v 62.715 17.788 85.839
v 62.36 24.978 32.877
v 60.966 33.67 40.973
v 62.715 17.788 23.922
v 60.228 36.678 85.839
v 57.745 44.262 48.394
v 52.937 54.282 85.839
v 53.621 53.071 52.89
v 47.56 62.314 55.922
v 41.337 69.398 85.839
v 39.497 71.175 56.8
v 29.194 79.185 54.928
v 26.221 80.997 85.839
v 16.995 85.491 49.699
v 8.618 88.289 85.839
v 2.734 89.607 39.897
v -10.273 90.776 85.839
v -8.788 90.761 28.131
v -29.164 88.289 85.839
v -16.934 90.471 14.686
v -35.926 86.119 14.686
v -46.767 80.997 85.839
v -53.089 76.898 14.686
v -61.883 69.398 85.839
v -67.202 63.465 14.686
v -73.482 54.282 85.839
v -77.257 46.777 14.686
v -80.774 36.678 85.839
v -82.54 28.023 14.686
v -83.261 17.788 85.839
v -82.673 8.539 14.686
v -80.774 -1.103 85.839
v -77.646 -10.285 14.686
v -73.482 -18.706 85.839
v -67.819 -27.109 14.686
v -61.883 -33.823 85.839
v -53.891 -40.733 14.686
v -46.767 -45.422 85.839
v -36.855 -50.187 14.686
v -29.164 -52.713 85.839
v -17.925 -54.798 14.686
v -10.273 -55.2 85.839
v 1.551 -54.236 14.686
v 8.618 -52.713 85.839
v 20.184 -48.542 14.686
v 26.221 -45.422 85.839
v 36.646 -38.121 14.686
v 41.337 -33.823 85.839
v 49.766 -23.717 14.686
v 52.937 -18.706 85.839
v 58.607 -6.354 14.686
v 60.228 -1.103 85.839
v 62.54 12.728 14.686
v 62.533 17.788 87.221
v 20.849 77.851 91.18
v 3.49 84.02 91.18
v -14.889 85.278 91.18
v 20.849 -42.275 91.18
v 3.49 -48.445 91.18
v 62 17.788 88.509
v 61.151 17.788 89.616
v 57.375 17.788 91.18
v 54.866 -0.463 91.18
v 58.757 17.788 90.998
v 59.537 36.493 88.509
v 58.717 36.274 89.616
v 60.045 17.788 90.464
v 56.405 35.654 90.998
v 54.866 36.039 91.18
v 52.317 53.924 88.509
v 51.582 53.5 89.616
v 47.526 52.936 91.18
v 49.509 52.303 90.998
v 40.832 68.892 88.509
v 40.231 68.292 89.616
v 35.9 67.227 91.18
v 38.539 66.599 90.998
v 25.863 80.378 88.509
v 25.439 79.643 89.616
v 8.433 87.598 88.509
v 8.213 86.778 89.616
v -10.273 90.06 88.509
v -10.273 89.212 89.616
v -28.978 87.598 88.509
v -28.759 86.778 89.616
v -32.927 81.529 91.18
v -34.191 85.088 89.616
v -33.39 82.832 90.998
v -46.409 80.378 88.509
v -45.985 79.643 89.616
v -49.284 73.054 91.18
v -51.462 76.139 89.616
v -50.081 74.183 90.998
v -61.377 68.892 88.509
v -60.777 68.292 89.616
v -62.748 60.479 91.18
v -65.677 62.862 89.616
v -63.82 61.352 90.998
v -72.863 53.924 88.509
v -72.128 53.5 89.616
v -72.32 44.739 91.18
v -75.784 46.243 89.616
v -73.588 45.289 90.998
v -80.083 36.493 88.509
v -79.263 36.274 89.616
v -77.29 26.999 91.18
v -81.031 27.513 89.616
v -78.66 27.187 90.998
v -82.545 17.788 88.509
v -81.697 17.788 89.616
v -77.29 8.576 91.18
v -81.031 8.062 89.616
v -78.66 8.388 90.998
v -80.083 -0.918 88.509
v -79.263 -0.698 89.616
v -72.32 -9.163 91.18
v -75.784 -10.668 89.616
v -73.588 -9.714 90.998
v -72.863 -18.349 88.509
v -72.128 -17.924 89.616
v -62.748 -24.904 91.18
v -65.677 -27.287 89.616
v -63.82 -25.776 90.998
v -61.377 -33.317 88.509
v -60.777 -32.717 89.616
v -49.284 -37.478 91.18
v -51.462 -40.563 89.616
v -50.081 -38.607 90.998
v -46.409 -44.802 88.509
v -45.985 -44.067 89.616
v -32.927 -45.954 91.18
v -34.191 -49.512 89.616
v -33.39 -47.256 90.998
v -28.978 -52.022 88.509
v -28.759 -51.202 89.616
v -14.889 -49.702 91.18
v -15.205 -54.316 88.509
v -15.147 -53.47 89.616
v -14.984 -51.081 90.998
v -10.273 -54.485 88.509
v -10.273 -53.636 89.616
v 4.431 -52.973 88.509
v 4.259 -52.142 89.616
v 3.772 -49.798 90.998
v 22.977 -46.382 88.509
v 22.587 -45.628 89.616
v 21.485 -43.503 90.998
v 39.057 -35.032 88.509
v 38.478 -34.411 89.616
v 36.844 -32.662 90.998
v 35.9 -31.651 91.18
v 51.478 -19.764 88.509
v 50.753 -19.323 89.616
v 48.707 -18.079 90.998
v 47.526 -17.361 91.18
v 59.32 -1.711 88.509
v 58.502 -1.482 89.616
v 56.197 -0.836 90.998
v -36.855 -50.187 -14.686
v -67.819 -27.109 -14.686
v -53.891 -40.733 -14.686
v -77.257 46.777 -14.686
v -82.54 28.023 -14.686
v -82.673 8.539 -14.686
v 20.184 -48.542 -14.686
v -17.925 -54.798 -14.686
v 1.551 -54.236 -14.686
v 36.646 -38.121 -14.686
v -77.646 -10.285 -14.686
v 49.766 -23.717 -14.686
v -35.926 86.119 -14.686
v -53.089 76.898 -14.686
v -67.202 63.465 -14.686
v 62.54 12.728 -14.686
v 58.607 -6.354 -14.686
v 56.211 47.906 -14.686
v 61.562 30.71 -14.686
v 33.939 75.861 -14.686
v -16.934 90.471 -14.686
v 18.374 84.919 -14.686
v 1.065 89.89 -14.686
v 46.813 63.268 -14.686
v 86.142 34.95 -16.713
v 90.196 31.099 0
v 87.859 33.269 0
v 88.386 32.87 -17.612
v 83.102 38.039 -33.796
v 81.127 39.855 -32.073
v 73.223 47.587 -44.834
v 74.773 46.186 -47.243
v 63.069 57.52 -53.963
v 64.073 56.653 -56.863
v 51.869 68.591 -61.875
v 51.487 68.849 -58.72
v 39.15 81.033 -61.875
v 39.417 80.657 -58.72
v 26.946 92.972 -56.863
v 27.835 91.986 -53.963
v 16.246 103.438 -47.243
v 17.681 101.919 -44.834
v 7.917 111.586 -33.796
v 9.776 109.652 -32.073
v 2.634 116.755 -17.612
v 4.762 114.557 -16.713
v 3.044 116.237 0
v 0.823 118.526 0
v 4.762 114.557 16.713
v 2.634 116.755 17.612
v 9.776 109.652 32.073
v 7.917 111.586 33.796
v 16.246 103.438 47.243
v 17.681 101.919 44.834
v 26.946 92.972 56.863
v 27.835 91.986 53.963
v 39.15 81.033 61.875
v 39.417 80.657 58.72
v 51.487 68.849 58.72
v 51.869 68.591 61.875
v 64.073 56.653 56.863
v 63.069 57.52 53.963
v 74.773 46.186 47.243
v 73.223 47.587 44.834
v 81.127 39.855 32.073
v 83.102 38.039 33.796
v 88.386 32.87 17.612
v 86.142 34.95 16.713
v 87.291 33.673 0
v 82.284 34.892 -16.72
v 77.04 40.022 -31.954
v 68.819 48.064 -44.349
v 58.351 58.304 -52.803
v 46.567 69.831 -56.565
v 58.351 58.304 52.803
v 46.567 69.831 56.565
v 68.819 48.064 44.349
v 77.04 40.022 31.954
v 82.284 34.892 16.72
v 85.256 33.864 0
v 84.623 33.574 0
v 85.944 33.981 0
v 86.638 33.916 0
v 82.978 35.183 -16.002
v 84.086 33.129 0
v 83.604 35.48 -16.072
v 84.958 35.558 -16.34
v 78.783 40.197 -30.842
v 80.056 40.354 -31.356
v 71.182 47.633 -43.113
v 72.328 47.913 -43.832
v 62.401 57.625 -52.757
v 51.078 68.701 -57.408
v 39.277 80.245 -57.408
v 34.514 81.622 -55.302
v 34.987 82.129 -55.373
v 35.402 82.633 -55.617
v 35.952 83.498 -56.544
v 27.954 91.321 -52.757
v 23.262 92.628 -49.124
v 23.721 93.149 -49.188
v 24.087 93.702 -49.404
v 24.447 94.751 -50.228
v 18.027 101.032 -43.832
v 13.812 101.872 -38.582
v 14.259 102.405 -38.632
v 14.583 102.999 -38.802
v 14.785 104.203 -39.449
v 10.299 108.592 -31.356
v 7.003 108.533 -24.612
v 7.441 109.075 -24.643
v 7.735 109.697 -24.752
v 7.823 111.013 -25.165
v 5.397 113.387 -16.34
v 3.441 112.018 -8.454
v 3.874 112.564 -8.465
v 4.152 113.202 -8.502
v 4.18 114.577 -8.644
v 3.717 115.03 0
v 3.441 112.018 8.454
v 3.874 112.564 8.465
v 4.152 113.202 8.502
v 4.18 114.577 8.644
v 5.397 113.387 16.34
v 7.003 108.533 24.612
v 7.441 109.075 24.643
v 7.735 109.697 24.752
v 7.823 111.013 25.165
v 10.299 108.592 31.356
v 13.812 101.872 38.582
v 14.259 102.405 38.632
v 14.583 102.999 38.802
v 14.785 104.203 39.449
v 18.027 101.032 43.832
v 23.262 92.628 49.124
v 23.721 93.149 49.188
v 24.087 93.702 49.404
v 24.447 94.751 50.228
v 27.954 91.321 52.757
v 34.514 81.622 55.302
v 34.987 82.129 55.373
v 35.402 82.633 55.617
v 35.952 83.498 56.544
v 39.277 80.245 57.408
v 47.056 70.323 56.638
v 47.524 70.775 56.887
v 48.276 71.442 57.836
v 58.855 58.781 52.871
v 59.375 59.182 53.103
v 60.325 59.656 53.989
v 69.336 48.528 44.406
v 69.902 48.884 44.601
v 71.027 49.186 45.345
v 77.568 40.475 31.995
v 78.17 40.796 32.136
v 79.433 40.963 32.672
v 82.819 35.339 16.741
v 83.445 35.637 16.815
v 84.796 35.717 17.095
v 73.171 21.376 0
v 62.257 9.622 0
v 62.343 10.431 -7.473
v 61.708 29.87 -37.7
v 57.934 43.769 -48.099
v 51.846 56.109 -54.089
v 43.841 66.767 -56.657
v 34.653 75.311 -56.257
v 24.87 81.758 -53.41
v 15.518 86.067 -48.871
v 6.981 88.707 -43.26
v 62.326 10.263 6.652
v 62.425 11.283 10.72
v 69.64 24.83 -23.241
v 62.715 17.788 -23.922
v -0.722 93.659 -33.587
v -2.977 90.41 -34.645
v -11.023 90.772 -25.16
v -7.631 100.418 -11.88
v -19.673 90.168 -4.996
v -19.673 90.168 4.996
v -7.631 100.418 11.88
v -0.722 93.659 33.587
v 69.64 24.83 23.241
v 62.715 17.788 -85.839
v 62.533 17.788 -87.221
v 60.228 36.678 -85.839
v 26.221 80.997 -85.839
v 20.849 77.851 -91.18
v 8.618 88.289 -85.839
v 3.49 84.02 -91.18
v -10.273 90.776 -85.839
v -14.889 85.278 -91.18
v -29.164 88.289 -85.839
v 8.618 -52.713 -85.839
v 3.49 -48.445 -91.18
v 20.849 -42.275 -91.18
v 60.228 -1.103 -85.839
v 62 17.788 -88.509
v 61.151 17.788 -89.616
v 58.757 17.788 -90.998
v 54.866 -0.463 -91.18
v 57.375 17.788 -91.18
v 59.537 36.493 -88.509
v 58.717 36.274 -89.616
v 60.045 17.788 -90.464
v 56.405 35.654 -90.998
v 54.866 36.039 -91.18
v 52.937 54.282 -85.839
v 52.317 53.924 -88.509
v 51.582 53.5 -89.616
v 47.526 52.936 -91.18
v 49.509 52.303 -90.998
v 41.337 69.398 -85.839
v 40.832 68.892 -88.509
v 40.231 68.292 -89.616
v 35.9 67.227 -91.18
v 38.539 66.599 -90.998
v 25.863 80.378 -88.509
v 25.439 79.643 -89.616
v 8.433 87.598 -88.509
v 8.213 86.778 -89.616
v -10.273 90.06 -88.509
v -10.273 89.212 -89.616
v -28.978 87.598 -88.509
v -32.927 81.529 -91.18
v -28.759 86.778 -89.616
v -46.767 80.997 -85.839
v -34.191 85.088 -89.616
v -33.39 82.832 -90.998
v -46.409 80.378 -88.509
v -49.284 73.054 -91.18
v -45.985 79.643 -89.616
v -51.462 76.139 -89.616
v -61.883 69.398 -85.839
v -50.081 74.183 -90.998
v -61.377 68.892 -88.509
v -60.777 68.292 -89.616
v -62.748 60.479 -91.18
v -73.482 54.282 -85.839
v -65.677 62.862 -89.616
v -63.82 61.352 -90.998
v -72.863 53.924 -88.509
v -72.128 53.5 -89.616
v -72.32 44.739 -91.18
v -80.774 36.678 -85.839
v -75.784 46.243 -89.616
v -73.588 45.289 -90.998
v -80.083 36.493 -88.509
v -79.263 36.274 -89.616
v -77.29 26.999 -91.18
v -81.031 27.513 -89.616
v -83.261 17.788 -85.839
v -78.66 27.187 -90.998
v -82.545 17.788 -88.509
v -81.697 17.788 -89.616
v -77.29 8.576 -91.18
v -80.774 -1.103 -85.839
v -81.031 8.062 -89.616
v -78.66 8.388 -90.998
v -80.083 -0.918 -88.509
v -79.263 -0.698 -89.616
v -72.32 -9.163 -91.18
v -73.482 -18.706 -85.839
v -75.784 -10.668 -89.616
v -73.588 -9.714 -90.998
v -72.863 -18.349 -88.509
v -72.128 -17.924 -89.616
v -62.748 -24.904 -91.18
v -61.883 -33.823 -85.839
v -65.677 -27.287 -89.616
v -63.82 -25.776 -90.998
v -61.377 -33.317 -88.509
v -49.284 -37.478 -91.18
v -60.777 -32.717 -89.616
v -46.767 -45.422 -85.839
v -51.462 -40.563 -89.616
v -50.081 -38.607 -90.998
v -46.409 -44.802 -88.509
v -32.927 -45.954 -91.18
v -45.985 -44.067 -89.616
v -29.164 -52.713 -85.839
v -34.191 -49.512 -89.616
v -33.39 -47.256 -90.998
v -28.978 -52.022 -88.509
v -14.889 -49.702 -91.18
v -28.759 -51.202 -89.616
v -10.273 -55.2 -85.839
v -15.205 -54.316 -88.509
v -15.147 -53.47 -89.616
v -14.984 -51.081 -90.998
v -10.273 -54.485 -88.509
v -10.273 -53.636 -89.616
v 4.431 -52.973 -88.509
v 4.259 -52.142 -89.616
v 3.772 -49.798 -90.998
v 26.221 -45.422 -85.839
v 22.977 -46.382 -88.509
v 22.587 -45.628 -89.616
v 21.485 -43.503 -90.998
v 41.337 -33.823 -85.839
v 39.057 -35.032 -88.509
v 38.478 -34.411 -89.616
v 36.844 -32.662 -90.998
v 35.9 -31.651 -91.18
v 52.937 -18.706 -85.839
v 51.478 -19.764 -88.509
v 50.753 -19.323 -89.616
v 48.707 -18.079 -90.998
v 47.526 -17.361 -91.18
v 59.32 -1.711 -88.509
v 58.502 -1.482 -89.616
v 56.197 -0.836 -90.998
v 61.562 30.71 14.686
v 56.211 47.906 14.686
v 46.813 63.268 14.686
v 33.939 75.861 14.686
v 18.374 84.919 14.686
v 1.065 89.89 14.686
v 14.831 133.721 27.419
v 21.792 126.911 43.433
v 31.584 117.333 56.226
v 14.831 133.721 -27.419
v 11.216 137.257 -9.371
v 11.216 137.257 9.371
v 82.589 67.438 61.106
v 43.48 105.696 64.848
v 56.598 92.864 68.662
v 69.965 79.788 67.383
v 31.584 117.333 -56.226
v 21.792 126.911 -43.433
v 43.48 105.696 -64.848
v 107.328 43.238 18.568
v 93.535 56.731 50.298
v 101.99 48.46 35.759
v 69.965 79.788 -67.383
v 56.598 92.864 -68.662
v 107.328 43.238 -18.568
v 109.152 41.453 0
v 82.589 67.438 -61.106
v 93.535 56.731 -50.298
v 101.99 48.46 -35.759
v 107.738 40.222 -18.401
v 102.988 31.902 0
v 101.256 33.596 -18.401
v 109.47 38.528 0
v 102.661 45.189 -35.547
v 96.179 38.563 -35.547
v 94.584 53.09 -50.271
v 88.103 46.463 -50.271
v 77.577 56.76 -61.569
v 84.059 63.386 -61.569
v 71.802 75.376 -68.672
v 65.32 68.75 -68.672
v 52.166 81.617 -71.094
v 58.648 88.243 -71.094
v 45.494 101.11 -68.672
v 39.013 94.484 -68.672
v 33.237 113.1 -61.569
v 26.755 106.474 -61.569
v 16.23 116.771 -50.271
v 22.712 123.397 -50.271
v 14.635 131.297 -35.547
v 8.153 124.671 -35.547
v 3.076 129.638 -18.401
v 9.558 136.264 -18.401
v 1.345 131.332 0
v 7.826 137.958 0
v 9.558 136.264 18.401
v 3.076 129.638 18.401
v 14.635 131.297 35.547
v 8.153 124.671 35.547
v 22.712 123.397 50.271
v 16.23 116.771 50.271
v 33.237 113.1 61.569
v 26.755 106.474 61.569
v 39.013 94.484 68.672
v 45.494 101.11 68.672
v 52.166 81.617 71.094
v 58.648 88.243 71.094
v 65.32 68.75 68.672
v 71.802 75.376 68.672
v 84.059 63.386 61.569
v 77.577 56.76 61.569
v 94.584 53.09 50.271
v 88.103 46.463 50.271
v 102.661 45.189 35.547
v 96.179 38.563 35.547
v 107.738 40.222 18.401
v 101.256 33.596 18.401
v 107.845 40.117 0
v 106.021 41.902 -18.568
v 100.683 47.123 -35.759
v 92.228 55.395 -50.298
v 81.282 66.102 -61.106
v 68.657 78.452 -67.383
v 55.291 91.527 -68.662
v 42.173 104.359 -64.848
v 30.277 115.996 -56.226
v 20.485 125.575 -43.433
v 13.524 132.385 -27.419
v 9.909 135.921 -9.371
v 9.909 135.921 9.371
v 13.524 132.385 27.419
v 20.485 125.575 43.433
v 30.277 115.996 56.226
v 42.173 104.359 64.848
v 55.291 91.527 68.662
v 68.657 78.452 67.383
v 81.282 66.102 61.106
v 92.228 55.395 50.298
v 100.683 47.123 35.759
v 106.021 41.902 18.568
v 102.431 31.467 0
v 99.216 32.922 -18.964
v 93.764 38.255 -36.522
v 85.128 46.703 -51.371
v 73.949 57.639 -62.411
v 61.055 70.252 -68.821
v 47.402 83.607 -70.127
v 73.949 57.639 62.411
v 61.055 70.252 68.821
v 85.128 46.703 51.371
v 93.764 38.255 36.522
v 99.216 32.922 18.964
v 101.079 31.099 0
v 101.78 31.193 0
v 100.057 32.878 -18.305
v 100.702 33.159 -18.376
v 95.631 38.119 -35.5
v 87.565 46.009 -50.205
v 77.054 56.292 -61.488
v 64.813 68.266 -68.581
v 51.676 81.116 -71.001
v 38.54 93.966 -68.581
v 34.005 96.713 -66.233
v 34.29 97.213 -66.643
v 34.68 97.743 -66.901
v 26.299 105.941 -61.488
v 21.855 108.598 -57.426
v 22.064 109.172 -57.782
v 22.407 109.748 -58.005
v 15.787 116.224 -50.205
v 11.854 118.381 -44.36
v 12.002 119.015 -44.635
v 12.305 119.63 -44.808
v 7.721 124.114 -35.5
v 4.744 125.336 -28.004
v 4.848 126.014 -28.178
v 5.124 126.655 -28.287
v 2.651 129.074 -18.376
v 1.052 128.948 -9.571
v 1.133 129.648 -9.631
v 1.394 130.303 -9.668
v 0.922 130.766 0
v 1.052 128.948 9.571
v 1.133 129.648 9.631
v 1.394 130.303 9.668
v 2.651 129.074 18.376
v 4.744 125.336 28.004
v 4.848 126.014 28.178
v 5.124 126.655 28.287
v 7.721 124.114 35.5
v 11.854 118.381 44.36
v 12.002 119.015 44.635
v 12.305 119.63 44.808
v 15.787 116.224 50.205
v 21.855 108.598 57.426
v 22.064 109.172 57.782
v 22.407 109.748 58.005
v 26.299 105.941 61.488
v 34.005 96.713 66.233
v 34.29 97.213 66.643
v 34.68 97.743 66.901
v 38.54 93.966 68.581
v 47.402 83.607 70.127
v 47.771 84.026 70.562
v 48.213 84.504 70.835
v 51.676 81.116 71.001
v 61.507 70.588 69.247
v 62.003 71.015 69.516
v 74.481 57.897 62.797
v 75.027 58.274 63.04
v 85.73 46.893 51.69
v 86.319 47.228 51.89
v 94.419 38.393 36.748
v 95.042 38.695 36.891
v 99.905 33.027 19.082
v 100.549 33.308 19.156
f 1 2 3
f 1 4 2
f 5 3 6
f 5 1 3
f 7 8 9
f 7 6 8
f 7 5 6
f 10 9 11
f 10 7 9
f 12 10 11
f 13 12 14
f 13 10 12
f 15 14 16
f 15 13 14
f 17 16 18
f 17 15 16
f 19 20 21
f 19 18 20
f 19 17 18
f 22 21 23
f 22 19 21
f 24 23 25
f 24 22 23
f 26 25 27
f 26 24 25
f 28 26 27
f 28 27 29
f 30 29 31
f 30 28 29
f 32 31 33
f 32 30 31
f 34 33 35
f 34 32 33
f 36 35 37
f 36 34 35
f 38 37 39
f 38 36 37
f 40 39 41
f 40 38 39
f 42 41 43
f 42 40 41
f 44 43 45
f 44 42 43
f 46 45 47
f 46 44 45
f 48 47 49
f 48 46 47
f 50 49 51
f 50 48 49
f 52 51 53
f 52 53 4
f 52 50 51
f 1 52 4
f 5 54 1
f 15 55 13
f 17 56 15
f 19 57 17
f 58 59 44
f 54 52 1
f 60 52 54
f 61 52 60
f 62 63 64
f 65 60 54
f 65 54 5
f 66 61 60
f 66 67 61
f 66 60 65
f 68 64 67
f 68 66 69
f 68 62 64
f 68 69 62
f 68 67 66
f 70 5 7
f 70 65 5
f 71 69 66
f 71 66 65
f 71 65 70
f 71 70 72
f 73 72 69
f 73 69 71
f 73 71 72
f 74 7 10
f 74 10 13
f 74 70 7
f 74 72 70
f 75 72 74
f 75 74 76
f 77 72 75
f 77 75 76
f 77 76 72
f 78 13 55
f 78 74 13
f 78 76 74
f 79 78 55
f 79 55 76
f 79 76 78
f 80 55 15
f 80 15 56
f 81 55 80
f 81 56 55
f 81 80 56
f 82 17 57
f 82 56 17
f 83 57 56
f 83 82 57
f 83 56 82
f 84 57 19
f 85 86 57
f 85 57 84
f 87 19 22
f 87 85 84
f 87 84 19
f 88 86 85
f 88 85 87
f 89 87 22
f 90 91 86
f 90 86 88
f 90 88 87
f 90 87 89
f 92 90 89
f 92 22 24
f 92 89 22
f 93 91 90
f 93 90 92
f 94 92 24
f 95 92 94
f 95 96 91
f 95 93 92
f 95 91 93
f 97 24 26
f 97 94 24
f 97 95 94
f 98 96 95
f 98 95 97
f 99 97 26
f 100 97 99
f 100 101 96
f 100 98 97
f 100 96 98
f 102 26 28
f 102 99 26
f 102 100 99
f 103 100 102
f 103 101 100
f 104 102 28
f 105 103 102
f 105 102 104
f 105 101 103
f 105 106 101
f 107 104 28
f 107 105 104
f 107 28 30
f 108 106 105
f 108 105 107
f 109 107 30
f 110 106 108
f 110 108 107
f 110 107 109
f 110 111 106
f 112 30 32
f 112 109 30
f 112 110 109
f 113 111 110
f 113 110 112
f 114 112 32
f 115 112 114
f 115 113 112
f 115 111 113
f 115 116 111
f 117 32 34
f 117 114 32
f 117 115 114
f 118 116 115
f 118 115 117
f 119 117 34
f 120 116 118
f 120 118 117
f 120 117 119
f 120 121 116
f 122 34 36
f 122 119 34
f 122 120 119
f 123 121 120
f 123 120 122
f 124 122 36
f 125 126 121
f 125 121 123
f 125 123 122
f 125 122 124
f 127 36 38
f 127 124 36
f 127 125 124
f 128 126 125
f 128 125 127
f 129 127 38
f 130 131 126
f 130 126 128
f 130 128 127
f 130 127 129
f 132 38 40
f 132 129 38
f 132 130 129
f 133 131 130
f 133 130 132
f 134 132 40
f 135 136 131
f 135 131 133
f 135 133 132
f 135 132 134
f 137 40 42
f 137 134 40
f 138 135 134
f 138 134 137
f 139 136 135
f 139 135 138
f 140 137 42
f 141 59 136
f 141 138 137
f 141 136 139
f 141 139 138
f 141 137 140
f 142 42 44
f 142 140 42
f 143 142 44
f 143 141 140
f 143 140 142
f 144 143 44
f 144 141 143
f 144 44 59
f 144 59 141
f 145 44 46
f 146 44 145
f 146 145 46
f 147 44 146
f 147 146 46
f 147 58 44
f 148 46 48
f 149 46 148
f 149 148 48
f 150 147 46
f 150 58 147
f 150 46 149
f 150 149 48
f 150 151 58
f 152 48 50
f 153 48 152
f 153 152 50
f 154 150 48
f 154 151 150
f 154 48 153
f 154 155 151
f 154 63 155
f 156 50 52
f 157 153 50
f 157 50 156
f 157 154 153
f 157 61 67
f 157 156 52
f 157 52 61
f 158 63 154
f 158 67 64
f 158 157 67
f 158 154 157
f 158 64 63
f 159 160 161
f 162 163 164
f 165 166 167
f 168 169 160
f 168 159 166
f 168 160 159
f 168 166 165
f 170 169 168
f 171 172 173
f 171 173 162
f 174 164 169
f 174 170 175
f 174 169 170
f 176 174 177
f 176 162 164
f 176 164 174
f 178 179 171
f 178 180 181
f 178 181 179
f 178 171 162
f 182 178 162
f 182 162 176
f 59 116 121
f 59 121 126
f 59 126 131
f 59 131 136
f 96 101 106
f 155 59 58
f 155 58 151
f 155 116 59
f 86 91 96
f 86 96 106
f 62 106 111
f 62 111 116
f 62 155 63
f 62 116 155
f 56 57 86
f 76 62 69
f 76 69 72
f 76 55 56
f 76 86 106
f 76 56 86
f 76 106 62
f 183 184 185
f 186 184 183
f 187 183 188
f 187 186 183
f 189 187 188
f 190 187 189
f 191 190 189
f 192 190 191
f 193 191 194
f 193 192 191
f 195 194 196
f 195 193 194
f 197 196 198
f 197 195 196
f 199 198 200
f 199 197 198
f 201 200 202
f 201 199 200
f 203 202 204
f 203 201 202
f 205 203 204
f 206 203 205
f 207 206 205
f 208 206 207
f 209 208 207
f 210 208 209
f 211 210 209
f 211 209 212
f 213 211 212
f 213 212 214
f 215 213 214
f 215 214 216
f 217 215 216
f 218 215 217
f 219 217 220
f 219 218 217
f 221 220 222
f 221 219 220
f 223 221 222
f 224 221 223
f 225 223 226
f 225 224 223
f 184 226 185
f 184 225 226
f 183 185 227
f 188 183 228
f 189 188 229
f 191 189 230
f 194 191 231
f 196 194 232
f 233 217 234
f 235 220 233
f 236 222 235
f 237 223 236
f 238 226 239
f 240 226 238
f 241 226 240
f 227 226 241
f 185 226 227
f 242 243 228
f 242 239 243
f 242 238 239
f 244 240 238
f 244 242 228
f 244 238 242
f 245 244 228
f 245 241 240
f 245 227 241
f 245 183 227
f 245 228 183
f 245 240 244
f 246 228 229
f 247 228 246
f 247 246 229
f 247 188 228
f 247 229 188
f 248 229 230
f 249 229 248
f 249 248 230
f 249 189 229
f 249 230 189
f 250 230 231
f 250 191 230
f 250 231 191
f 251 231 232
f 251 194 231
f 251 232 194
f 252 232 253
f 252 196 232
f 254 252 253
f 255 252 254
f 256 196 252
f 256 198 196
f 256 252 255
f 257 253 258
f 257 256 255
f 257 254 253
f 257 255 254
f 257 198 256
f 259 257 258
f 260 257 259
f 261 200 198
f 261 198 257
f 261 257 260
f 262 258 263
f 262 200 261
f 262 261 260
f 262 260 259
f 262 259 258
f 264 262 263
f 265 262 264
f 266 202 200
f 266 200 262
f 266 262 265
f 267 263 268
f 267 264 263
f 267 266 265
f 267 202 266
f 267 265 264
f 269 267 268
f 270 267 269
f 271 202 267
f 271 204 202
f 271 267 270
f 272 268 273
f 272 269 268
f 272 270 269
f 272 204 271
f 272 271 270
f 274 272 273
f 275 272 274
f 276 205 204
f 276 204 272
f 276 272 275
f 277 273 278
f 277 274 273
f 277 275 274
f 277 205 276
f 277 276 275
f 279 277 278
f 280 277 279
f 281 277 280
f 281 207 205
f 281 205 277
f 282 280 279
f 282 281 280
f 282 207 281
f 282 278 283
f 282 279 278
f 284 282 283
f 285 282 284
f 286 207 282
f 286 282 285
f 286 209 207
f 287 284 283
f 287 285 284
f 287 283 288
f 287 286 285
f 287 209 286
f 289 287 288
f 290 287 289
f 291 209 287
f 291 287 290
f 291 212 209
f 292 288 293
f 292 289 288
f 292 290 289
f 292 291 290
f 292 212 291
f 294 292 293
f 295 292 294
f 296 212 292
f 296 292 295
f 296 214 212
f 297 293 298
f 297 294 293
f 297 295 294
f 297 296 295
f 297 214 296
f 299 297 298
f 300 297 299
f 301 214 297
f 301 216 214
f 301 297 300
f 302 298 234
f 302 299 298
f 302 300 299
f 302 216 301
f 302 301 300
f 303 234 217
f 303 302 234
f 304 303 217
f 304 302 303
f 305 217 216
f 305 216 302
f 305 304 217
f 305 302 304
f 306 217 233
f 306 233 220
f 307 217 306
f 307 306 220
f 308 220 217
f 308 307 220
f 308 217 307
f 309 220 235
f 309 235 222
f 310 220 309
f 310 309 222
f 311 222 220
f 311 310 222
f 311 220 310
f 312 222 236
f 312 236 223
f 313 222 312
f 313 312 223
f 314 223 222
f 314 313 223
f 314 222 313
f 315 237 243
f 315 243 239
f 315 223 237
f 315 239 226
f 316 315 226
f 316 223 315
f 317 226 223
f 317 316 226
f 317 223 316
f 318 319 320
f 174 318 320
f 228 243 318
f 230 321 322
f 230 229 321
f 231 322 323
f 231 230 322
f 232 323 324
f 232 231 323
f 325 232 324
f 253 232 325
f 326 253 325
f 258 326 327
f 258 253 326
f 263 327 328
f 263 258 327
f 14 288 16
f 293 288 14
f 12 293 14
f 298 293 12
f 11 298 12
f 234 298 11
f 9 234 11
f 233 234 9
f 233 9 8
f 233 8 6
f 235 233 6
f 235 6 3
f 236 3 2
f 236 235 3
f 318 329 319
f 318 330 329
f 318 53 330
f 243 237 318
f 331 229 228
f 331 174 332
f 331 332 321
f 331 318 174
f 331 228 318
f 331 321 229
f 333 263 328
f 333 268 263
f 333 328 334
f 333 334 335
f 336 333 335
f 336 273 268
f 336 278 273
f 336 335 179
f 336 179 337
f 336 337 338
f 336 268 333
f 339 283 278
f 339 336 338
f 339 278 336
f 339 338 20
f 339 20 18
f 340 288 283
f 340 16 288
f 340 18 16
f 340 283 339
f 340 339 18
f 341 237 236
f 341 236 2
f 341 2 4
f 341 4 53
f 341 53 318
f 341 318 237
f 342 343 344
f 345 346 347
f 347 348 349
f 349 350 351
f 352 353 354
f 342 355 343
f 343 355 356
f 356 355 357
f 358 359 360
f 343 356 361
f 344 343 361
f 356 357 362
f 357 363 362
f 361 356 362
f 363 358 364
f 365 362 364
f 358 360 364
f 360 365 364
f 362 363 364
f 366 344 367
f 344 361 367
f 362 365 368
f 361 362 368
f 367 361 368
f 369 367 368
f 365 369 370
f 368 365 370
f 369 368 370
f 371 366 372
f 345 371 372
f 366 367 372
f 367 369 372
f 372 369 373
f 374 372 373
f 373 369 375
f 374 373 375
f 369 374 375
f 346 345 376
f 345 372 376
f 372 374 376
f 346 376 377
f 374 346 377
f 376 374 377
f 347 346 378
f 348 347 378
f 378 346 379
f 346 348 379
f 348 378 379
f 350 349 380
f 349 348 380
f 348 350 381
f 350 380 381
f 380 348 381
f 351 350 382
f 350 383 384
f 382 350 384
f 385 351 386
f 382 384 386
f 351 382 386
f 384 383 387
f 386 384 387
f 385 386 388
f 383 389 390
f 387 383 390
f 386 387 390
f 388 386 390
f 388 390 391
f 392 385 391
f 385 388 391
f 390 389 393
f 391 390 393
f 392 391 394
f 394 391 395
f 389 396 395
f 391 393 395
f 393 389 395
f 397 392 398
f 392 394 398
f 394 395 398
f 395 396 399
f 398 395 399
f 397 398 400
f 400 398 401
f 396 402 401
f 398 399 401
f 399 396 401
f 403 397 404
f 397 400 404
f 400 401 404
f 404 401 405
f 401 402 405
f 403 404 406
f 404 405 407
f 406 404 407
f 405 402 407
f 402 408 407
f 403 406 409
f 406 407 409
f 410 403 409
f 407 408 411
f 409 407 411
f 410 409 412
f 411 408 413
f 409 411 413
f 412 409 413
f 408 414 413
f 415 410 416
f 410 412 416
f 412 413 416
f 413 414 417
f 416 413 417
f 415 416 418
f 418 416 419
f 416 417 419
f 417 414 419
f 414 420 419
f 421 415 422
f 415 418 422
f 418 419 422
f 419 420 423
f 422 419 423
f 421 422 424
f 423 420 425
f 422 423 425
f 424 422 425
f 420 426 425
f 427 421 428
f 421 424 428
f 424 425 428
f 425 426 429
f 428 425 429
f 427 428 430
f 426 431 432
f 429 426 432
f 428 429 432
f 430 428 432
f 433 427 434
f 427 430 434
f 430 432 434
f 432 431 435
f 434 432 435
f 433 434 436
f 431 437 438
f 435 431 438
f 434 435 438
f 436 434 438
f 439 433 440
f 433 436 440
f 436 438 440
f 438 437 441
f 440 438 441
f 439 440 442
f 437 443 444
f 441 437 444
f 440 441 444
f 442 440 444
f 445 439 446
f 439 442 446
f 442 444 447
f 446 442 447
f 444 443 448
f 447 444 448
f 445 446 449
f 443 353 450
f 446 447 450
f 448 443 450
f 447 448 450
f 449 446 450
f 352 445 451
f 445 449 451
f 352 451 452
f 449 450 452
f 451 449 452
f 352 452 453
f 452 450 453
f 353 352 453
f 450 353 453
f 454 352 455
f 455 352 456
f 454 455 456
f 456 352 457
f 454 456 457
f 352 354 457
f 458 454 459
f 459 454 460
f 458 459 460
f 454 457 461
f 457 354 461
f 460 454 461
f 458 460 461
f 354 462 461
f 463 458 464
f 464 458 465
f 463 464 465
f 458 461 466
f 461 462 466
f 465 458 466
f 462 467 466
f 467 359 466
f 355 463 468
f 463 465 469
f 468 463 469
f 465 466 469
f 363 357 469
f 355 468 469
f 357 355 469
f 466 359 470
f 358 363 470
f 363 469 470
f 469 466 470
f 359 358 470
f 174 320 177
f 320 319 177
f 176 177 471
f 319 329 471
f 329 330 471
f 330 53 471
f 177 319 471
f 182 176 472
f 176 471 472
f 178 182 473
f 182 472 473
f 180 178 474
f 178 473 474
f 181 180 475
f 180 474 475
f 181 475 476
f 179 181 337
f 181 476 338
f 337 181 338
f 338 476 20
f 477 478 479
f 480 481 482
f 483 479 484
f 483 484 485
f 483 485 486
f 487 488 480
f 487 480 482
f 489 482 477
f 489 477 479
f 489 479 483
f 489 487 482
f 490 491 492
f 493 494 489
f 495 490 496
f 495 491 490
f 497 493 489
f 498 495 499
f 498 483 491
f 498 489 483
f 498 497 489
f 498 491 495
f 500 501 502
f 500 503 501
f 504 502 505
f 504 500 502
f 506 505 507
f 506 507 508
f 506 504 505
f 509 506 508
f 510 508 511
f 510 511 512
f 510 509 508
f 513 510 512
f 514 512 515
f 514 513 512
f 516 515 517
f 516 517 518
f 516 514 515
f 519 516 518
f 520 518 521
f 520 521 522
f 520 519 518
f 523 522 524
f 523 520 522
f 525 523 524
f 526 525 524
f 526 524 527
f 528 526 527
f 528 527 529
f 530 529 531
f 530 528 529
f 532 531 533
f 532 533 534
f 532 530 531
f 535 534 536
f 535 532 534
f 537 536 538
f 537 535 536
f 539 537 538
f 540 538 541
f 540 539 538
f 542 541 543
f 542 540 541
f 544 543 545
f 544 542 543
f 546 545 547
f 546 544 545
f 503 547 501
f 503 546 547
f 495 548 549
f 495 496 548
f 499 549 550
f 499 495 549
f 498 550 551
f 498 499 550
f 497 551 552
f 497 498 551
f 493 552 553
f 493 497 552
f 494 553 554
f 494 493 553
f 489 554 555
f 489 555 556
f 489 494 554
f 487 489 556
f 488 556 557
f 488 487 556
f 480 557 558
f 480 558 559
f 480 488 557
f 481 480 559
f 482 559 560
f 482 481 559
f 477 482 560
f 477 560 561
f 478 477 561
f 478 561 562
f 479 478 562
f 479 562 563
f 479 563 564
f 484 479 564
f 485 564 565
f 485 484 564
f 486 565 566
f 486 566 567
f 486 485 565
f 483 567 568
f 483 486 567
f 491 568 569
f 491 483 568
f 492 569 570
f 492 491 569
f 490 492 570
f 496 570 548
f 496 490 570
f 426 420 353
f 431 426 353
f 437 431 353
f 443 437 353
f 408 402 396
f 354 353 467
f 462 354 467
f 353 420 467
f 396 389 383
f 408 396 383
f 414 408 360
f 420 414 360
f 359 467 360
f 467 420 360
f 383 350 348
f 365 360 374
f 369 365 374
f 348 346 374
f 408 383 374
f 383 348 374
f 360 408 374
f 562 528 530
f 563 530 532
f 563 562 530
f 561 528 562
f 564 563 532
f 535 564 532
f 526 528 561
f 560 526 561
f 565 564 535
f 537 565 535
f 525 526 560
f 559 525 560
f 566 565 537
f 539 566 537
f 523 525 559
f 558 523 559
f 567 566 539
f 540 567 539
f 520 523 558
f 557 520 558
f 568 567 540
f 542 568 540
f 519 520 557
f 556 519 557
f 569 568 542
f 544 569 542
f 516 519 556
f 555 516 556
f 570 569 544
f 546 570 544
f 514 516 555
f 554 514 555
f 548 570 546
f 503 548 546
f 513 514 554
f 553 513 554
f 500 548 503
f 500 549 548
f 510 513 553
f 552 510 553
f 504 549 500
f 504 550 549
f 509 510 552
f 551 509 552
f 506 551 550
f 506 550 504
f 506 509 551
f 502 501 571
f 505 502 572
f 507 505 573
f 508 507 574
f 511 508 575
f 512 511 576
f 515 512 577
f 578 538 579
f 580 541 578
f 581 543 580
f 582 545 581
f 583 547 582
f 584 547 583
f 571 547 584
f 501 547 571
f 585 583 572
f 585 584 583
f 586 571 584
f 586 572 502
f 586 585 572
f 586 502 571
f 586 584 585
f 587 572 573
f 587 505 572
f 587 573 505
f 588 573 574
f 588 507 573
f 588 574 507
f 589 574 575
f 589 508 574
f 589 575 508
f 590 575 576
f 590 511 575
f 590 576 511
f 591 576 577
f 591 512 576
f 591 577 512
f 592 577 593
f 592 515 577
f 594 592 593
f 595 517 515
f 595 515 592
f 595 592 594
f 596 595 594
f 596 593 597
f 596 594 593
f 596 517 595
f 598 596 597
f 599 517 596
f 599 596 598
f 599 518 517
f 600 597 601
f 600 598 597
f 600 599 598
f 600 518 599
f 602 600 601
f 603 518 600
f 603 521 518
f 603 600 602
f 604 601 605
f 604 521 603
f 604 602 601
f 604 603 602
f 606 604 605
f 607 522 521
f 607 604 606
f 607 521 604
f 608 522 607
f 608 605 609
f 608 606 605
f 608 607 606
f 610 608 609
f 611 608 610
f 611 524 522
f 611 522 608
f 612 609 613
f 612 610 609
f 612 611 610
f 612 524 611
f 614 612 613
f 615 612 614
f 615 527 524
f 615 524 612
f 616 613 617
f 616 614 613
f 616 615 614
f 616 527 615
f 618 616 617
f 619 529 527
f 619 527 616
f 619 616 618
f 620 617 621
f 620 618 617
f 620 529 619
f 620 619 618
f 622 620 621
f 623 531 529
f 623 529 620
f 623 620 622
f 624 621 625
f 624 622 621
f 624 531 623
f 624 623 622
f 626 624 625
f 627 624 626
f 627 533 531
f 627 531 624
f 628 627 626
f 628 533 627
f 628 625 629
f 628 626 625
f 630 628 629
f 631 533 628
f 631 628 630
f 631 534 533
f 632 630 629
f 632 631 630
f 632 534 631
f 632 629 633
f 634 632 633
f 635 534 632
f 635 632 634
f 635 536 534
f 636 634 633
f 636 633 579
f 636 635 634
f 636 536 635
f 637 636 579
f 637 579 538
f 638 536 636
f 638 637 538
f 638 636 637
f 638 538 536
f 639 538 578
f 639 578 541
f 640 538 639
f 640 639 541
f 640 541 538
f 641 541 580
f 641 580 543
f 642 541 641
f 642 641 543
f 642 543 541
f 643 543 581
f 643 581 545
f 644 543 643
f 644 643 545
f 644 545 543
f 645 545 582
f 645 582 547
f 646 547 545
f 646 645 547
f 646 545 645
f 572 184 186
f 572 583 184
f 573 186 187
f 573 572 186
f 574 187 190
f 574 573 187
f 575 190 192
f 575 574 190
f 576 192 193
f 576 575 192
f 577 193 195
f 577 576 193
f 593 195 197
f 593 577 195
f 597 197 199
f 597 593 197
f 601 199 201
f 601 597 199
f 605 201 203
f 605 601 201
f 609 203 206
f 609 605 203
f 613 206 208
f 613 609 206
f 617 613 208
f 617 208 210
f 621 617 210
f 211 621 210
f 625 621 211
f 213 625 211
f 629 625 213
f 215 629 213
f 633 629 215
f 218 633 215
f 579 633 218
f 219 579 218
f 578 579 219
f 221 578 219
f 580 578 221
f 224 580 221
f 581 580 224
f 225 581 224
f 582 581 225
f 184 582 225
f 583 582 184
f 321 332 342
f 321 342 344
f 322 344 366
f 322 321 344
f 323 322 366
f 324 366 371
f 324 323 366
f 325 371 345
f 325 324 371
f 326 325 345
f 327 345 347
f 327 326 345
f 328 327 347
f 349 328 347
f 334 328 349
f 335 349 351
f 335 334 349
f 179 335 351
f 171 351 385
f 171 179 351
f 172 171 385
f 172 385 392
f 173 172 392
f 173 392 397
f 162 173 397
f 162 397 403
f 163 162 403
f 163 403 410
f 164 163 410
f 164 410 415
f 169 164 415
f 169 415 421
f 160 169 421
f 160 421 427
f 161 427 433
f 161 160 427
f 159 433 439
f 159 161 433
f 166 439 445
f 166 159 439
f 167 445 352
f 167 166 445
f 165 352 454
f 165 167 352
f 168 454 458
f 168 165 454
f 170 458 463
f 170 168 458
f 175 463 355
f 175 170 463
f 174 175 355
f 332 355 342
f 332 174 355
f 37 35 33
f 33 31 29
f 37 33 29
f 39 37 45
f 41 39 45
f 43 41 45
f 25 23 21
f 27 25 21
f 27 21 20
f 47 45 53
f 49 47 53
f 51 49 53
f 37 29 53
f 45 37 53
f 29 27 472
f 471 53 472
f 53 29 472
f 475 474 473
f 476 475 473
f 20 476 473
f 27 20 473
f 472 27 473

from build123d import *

# Parameters (mm, degrees)
SKETCH2_R           = 34.7138244
BOSS_EXTRUDE1_DEPTH = 43.3659661
FILLET1_R           = 2.54
SKETCH4_R           = 34.7138244
CUT_EXTRUDE1_DEPTH  = 6.985
SCALE1_SCALE        = 2.1025641


with BuildPart() as part:
    # Sketch2 → Boss-Extrude1 (new body, symmetric)
    with BuildSketch(Plane.XY):
        with Locations((-4.885886043, 8.460037767)):
            Circle(SKETCH2_R)
    extrude(amount=BOSS_EXTRUDE1_DEPTH, both=True)

    # Sketch3 → Revolve1 (revolve)
    with BuildSketch(Plane.XY):
        with BuildLine():
            Line((22.617188767, -2.954559536), (39.991940689, 15.756711766))
            ThreePointArc((39.991940689, 15.756711766), (40.875583615, 16.161668708), (41.78676132, 15.823186604))
            Line((41.78676132, 15.823186604), (42.898157249, 14.791176098))
            Line((42.898157249, 14.791176098), (48.074161234, 14.791176098))
            ThreePointArc((48.074161234, 14.791176098), (48.566620636, 14.890542194), (48.982018985, 15.173091472))
            Line((48.982018985, 15.173091472), (52.064778569, 18.324488421))
            Line((52.064778569, 18.324488421), (51.292291814, 19.080150428))
            Line((51.292291814, 19.080150428), (51.913951053, 19.715650854))
            Line((51.913951053, 19.715650854), (28.515190783, 42.604786571))
            Line((28.515190783, 42.604786571), (2.85696712, 16.37528486))
            Line((2.85696712, 16.37528486), (22.617188767, -2.954559536))
        make_face()
    revolve(axis=Axis((2.85696712, 16.37528486, 0), (0.699279233, 0.714848623, 0)))

    # Fillet1
    fillet1_edges = [part.edges().sort_by_distance(p)[0] for p in [
        (-39.599710443, 8.460037767, -43.3659661),
        (-39.599710443, 8.460037767, 43.3659661),
    ]]
    fillet(fillet1_edges, radius=FILLET1_R)

    # Sketch4 → Cut-Extrude1 (cut, symmetric)
    with BuildSketch(Plane.XY):
        with Locations((-4.885886043, 8.460037767)):
            Circle(SKETCH4_R)
    extrude(amount=CUT_EXTRUDE1_DEPTH, both=True, mode=Mode.SUBTRACT)


with BuildPart() as part_1:
    # Scale1: scaled about (0, 0, 0)
    add(part.part.scale(SCALE1_SCALE))


solid = part_1.part
